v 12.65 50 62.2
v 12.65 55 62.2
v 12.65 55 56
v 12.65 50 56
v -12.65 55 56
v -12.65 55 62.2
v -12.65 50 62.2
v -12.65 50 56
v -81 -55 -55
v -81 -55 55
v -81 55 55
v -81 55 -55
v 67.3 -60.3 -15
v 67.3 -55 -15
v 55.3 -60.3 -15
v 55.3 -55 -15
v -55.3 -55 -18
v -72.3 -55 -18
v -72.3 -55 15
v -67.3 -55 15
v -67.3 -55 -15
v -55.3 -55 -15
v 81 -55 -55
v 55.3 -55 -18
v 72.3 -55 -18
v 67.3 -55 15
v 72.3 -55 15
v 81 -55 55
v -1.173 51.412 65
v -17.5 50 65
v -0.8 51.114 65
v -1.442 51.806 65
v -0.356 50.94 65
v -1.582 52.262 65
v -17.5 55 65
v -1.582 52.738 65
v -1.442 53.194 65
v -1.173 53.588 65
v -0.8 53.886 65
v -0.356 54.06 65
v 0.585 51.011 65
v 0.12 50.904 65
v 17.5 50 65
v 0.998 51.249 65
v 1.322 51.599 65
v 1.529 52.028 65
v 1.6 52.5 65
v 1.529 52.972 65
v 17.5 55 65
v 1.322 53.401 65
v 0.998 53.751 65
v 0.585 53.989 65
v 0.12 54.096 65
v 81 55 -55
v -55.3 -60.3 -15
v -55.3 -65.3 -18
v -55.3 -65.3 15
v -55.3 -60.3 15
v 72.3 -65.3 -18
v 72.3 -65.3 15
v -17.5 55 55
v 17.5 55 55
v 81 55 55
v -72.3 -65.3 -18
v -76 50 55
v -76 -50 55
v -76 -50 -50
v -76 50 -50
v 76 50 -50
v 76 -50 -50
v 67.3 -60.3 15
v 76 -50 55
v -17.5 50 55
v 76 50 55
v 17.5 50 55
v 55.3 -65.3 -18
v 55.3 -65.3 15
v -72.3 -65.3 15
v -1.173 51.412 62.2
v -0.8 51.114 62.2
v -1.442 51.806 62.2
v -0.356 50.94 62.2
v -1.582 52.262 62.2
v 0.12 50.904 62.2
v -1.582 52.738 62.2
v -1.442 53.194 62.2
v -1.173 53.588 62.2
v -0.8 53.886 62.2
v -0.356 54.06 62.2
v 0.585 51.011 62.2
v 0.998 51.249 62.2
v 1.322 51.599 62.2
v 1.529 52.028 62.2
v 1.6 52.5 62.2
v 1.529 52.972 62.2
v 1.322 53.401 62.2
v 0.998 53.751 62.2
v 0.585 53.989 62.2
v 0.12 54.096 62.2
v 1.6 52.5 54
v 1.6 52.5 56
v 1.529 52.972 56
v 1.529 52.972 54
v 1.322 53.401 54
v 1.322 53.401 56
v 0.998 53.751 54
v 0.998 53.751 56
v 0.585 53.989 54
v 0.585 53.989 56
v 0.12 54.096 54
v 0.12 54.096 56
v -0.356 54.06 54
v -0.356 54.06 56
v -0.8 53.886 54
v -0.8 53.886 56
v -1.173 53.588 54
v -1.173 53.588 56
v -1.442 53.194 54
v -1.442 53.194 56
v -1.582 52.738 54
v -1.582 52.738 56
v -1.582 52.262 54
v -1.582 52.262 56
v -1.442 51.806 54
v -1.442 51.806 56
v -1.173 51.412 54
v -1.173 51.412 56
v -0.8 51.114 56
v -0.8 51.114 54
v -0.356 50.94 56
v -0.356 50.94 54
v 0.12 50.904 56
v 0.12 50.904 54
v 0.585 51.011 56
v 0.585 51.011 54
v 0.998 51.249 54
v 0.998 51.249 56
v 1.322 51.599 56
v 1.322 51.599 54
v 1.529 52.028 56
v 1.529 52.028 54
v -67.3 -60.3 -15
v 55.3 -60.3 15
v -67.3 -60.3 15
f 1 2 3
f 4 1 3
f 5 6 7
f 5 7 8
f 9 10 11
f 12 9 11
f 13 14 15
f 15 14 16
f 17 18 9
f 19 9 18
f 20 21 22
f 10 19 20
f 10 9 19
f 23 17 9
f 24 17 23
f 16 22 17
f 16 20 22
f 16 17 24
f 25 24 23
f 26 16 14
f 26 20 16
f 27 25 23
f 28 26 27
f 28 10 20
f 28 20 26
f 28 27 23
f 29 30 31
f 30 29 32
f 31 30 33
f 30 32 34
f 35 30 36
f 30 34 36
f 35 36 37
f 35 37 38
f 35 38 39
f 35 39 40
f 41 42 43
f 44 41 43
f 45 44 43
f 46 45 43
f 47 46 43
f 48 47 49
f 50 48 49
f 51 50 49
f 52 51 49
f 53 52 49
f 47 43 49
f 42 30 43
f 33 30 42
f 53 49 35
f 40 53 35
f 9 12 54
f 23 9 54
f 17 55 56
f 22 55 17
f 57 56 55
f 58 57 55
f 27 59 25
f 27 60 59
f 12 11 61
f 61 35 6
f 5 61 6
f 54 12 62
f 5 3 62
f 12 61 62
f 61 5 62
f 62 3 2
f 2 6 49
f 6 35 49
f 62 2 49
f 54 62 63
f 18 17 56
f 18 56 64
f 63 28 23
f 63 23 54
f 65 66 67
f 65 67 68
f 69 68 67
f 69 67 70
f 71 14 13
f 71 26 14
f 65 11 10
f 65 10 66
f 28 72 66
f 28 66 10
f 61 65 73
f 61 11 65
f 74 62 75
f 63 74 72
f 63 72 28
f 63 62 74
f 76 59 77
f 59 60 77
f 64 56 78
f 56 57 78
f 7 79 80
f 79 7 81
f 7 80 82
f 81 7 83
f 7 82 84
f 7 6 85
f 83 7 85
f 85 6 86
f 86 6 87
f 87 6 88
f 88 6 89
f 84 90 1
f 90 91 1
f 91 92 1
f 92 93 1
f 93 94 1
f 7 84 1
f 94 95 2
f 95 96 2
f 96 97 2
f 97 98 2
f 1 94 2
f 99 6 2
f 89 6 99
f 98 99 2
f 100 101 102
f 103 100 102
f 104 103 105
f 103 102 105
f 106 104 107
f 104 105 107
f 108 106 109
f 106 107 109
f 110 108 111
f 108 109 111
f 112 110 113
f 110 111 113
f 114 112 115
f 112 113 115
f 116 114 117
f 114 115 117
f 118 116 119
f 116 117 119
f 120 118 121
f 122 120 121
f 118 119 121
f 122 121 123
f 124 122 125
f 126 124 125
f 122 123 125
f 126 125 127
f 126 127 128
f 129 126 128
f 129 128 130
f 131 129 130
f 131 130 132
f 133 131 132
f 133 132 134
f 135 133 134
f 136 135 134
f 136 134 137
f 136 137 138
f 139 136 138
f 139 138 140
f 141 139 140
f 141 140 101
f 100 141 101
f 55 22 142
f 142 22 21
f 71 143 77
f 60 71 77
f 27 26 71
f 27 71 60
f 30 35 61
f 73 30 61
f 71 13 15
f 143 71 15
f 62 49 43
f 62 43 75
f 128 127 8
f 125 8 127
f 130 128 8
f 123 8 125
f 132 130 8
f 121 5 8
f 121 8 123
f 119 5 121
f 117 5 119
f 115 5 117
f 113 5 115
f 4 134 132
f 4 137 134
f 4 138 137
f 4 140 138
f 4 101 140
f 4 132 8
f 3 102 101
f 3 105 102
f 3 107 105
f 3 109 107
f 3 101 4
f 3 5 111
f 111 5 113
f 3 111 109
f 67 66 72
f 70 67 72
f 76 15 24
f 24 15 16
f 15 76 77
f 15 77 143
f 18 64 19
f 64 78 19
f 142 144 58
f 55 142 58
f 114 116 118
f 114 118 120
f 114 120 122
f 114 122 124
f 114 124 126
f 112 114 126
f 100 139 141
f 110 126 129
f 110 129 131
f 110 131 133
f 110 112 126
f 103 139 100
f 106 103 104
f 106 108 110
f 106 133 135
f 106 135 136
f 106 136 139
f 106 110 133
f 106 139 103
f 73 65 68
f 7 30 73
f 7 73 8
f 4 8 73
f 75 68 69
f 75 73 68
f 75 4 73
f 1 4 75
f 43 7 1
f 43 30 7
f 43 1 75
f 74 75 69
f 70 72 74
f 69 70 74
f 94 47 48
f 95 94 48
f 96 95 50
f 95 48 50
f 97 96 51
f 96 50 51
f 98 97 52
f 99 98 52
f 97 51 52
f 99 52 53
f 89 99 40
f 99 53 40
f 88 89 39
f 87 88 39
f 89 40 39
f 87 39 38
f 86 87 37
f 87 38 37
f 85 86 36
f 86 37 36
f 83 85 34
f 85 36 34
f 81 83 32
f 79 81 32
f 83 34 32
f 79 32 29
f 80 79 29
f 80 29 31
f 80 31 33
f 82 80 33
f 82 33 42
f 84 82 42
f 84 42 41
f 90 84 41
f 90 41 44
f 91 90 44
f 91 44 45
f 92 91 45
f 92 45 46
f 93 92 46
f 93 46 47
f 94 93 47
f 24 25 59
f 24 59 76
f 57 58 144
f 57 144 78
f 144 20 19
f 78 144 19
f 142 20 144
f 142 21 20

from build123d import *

# Parameters (mm, degrees)
SKETCH1_W           = 162
SKETCH1_H           = 110
BOSS_EXTRUDE1_DEPTH = 55
SHELL1_T            = -5
BOSS_EXTRUDE3_DEPTH = 15
SKETCH6_W           = 17
SKETCH6_H           = 10.3
BOSS_EXTRUDE4_DEPTH = 3
SKETCH8_W           = 10
SKETCH8_H           = 5
BOSS_EXTRUDE5_DEPTH = 17.5
SKETCH9_W           = 25.3
SKETCH9_H           = 6.2
CUT_EXTRUDE1_DEPTH  = 5
SKETCH10_R          = 1.6
CUT_EXTRUDE2_DEPTH  = 11


with BuildPart() as part:
    # Sketch1 → Boss-Extrude1 (new, symmetric)
    with BuildSketch(Plane.XY):
        Rectangle(SKETCH1_W, SKETCH1_H)
    extrude(amount=BOSS_EXTRUDE1_DEPTH, both=True)

    # Shell1
    shell1_openings = [part.faces().sort_by_distance(p)[0] for p in [
        (0, 0, 55),
    ]]
    offset(amount=SHELL1_T, openings=shell1_openings, kind=Kind.INTERSECTION)

    # Sketch5 → Boss-Extrude3 (add, symmetric)
    with BuildSketch(Plane.XY):
        Polygon((-67.3, -55), (-67.3, -60.3), (-55.3, -60.3), (-55.3, -65.3), (-72.3, -65.3), (-72.3, -55), align=None)
        Polygon((67.3, -55), (67.3, -60.3), (55.3, -60.3), (55.3, -65.3), (72.3, -65.3), (72.3, -55), align=None)
    extrude(amount=BOSS_EXTRUDE3_DEPTH, both=True)

    # Sketch6 → Boss-Extrude4 (add)
    with BuildSketch(Plane(origin=(0, 0, -15), x_dir=(-1, 0, 0), z_dir=(0, 0, -1))):
        with Locations((63.8, -60.15)):
            Rectangle(SKETCH6_W, SKETCH6_H)
        with Locations((-63.8, -60.15)):
            Rectangle(SKETCH6_W, SKETCH6_H)
    extrude(amount=BOSS_EXTRUDE4_DEPTH)

    # Sketch8 → Boss-Extrude5 (add, symmetric)
    with BuildSketch(Plane(origin=(0, 0, 0), x_dir=(0, 0, -1), z_dir=(1, 0, 0))):
        with Locations((-60, 52.5)):
            Rectangle(SKETCH8_W, SKETCH8_H)
    extrude(amount=BOSS_EXTRUDE5_DEPTH, both=True)

    # Sketch9 → Cut-Extrude1 (cut)
    with BuildSketch(Plane(origin=(0, 55, 0), x_dir=(1, 0, 0), z_dir=(0, 1, 0))):
        with Locations((0, -59.1)):
            Rectangle(SKETCH9_W, SKETCH9_H)
    extrude(amount=-CUT_EXTRUDE1_DEPTH, mode=Mode.SUBTRACT)

    # Sketch10 → Cut-Extrude2 (cut)
    with BuildSketch(Plane.XY.offset(65)):
        with Locations((0, 52.5)):
            Circle(SKETCH10_R)
    extrude(amount=-CUT_EXTRUDE2_DEPTH, mode=Mode.SUBTRACT)


solid = part.part
